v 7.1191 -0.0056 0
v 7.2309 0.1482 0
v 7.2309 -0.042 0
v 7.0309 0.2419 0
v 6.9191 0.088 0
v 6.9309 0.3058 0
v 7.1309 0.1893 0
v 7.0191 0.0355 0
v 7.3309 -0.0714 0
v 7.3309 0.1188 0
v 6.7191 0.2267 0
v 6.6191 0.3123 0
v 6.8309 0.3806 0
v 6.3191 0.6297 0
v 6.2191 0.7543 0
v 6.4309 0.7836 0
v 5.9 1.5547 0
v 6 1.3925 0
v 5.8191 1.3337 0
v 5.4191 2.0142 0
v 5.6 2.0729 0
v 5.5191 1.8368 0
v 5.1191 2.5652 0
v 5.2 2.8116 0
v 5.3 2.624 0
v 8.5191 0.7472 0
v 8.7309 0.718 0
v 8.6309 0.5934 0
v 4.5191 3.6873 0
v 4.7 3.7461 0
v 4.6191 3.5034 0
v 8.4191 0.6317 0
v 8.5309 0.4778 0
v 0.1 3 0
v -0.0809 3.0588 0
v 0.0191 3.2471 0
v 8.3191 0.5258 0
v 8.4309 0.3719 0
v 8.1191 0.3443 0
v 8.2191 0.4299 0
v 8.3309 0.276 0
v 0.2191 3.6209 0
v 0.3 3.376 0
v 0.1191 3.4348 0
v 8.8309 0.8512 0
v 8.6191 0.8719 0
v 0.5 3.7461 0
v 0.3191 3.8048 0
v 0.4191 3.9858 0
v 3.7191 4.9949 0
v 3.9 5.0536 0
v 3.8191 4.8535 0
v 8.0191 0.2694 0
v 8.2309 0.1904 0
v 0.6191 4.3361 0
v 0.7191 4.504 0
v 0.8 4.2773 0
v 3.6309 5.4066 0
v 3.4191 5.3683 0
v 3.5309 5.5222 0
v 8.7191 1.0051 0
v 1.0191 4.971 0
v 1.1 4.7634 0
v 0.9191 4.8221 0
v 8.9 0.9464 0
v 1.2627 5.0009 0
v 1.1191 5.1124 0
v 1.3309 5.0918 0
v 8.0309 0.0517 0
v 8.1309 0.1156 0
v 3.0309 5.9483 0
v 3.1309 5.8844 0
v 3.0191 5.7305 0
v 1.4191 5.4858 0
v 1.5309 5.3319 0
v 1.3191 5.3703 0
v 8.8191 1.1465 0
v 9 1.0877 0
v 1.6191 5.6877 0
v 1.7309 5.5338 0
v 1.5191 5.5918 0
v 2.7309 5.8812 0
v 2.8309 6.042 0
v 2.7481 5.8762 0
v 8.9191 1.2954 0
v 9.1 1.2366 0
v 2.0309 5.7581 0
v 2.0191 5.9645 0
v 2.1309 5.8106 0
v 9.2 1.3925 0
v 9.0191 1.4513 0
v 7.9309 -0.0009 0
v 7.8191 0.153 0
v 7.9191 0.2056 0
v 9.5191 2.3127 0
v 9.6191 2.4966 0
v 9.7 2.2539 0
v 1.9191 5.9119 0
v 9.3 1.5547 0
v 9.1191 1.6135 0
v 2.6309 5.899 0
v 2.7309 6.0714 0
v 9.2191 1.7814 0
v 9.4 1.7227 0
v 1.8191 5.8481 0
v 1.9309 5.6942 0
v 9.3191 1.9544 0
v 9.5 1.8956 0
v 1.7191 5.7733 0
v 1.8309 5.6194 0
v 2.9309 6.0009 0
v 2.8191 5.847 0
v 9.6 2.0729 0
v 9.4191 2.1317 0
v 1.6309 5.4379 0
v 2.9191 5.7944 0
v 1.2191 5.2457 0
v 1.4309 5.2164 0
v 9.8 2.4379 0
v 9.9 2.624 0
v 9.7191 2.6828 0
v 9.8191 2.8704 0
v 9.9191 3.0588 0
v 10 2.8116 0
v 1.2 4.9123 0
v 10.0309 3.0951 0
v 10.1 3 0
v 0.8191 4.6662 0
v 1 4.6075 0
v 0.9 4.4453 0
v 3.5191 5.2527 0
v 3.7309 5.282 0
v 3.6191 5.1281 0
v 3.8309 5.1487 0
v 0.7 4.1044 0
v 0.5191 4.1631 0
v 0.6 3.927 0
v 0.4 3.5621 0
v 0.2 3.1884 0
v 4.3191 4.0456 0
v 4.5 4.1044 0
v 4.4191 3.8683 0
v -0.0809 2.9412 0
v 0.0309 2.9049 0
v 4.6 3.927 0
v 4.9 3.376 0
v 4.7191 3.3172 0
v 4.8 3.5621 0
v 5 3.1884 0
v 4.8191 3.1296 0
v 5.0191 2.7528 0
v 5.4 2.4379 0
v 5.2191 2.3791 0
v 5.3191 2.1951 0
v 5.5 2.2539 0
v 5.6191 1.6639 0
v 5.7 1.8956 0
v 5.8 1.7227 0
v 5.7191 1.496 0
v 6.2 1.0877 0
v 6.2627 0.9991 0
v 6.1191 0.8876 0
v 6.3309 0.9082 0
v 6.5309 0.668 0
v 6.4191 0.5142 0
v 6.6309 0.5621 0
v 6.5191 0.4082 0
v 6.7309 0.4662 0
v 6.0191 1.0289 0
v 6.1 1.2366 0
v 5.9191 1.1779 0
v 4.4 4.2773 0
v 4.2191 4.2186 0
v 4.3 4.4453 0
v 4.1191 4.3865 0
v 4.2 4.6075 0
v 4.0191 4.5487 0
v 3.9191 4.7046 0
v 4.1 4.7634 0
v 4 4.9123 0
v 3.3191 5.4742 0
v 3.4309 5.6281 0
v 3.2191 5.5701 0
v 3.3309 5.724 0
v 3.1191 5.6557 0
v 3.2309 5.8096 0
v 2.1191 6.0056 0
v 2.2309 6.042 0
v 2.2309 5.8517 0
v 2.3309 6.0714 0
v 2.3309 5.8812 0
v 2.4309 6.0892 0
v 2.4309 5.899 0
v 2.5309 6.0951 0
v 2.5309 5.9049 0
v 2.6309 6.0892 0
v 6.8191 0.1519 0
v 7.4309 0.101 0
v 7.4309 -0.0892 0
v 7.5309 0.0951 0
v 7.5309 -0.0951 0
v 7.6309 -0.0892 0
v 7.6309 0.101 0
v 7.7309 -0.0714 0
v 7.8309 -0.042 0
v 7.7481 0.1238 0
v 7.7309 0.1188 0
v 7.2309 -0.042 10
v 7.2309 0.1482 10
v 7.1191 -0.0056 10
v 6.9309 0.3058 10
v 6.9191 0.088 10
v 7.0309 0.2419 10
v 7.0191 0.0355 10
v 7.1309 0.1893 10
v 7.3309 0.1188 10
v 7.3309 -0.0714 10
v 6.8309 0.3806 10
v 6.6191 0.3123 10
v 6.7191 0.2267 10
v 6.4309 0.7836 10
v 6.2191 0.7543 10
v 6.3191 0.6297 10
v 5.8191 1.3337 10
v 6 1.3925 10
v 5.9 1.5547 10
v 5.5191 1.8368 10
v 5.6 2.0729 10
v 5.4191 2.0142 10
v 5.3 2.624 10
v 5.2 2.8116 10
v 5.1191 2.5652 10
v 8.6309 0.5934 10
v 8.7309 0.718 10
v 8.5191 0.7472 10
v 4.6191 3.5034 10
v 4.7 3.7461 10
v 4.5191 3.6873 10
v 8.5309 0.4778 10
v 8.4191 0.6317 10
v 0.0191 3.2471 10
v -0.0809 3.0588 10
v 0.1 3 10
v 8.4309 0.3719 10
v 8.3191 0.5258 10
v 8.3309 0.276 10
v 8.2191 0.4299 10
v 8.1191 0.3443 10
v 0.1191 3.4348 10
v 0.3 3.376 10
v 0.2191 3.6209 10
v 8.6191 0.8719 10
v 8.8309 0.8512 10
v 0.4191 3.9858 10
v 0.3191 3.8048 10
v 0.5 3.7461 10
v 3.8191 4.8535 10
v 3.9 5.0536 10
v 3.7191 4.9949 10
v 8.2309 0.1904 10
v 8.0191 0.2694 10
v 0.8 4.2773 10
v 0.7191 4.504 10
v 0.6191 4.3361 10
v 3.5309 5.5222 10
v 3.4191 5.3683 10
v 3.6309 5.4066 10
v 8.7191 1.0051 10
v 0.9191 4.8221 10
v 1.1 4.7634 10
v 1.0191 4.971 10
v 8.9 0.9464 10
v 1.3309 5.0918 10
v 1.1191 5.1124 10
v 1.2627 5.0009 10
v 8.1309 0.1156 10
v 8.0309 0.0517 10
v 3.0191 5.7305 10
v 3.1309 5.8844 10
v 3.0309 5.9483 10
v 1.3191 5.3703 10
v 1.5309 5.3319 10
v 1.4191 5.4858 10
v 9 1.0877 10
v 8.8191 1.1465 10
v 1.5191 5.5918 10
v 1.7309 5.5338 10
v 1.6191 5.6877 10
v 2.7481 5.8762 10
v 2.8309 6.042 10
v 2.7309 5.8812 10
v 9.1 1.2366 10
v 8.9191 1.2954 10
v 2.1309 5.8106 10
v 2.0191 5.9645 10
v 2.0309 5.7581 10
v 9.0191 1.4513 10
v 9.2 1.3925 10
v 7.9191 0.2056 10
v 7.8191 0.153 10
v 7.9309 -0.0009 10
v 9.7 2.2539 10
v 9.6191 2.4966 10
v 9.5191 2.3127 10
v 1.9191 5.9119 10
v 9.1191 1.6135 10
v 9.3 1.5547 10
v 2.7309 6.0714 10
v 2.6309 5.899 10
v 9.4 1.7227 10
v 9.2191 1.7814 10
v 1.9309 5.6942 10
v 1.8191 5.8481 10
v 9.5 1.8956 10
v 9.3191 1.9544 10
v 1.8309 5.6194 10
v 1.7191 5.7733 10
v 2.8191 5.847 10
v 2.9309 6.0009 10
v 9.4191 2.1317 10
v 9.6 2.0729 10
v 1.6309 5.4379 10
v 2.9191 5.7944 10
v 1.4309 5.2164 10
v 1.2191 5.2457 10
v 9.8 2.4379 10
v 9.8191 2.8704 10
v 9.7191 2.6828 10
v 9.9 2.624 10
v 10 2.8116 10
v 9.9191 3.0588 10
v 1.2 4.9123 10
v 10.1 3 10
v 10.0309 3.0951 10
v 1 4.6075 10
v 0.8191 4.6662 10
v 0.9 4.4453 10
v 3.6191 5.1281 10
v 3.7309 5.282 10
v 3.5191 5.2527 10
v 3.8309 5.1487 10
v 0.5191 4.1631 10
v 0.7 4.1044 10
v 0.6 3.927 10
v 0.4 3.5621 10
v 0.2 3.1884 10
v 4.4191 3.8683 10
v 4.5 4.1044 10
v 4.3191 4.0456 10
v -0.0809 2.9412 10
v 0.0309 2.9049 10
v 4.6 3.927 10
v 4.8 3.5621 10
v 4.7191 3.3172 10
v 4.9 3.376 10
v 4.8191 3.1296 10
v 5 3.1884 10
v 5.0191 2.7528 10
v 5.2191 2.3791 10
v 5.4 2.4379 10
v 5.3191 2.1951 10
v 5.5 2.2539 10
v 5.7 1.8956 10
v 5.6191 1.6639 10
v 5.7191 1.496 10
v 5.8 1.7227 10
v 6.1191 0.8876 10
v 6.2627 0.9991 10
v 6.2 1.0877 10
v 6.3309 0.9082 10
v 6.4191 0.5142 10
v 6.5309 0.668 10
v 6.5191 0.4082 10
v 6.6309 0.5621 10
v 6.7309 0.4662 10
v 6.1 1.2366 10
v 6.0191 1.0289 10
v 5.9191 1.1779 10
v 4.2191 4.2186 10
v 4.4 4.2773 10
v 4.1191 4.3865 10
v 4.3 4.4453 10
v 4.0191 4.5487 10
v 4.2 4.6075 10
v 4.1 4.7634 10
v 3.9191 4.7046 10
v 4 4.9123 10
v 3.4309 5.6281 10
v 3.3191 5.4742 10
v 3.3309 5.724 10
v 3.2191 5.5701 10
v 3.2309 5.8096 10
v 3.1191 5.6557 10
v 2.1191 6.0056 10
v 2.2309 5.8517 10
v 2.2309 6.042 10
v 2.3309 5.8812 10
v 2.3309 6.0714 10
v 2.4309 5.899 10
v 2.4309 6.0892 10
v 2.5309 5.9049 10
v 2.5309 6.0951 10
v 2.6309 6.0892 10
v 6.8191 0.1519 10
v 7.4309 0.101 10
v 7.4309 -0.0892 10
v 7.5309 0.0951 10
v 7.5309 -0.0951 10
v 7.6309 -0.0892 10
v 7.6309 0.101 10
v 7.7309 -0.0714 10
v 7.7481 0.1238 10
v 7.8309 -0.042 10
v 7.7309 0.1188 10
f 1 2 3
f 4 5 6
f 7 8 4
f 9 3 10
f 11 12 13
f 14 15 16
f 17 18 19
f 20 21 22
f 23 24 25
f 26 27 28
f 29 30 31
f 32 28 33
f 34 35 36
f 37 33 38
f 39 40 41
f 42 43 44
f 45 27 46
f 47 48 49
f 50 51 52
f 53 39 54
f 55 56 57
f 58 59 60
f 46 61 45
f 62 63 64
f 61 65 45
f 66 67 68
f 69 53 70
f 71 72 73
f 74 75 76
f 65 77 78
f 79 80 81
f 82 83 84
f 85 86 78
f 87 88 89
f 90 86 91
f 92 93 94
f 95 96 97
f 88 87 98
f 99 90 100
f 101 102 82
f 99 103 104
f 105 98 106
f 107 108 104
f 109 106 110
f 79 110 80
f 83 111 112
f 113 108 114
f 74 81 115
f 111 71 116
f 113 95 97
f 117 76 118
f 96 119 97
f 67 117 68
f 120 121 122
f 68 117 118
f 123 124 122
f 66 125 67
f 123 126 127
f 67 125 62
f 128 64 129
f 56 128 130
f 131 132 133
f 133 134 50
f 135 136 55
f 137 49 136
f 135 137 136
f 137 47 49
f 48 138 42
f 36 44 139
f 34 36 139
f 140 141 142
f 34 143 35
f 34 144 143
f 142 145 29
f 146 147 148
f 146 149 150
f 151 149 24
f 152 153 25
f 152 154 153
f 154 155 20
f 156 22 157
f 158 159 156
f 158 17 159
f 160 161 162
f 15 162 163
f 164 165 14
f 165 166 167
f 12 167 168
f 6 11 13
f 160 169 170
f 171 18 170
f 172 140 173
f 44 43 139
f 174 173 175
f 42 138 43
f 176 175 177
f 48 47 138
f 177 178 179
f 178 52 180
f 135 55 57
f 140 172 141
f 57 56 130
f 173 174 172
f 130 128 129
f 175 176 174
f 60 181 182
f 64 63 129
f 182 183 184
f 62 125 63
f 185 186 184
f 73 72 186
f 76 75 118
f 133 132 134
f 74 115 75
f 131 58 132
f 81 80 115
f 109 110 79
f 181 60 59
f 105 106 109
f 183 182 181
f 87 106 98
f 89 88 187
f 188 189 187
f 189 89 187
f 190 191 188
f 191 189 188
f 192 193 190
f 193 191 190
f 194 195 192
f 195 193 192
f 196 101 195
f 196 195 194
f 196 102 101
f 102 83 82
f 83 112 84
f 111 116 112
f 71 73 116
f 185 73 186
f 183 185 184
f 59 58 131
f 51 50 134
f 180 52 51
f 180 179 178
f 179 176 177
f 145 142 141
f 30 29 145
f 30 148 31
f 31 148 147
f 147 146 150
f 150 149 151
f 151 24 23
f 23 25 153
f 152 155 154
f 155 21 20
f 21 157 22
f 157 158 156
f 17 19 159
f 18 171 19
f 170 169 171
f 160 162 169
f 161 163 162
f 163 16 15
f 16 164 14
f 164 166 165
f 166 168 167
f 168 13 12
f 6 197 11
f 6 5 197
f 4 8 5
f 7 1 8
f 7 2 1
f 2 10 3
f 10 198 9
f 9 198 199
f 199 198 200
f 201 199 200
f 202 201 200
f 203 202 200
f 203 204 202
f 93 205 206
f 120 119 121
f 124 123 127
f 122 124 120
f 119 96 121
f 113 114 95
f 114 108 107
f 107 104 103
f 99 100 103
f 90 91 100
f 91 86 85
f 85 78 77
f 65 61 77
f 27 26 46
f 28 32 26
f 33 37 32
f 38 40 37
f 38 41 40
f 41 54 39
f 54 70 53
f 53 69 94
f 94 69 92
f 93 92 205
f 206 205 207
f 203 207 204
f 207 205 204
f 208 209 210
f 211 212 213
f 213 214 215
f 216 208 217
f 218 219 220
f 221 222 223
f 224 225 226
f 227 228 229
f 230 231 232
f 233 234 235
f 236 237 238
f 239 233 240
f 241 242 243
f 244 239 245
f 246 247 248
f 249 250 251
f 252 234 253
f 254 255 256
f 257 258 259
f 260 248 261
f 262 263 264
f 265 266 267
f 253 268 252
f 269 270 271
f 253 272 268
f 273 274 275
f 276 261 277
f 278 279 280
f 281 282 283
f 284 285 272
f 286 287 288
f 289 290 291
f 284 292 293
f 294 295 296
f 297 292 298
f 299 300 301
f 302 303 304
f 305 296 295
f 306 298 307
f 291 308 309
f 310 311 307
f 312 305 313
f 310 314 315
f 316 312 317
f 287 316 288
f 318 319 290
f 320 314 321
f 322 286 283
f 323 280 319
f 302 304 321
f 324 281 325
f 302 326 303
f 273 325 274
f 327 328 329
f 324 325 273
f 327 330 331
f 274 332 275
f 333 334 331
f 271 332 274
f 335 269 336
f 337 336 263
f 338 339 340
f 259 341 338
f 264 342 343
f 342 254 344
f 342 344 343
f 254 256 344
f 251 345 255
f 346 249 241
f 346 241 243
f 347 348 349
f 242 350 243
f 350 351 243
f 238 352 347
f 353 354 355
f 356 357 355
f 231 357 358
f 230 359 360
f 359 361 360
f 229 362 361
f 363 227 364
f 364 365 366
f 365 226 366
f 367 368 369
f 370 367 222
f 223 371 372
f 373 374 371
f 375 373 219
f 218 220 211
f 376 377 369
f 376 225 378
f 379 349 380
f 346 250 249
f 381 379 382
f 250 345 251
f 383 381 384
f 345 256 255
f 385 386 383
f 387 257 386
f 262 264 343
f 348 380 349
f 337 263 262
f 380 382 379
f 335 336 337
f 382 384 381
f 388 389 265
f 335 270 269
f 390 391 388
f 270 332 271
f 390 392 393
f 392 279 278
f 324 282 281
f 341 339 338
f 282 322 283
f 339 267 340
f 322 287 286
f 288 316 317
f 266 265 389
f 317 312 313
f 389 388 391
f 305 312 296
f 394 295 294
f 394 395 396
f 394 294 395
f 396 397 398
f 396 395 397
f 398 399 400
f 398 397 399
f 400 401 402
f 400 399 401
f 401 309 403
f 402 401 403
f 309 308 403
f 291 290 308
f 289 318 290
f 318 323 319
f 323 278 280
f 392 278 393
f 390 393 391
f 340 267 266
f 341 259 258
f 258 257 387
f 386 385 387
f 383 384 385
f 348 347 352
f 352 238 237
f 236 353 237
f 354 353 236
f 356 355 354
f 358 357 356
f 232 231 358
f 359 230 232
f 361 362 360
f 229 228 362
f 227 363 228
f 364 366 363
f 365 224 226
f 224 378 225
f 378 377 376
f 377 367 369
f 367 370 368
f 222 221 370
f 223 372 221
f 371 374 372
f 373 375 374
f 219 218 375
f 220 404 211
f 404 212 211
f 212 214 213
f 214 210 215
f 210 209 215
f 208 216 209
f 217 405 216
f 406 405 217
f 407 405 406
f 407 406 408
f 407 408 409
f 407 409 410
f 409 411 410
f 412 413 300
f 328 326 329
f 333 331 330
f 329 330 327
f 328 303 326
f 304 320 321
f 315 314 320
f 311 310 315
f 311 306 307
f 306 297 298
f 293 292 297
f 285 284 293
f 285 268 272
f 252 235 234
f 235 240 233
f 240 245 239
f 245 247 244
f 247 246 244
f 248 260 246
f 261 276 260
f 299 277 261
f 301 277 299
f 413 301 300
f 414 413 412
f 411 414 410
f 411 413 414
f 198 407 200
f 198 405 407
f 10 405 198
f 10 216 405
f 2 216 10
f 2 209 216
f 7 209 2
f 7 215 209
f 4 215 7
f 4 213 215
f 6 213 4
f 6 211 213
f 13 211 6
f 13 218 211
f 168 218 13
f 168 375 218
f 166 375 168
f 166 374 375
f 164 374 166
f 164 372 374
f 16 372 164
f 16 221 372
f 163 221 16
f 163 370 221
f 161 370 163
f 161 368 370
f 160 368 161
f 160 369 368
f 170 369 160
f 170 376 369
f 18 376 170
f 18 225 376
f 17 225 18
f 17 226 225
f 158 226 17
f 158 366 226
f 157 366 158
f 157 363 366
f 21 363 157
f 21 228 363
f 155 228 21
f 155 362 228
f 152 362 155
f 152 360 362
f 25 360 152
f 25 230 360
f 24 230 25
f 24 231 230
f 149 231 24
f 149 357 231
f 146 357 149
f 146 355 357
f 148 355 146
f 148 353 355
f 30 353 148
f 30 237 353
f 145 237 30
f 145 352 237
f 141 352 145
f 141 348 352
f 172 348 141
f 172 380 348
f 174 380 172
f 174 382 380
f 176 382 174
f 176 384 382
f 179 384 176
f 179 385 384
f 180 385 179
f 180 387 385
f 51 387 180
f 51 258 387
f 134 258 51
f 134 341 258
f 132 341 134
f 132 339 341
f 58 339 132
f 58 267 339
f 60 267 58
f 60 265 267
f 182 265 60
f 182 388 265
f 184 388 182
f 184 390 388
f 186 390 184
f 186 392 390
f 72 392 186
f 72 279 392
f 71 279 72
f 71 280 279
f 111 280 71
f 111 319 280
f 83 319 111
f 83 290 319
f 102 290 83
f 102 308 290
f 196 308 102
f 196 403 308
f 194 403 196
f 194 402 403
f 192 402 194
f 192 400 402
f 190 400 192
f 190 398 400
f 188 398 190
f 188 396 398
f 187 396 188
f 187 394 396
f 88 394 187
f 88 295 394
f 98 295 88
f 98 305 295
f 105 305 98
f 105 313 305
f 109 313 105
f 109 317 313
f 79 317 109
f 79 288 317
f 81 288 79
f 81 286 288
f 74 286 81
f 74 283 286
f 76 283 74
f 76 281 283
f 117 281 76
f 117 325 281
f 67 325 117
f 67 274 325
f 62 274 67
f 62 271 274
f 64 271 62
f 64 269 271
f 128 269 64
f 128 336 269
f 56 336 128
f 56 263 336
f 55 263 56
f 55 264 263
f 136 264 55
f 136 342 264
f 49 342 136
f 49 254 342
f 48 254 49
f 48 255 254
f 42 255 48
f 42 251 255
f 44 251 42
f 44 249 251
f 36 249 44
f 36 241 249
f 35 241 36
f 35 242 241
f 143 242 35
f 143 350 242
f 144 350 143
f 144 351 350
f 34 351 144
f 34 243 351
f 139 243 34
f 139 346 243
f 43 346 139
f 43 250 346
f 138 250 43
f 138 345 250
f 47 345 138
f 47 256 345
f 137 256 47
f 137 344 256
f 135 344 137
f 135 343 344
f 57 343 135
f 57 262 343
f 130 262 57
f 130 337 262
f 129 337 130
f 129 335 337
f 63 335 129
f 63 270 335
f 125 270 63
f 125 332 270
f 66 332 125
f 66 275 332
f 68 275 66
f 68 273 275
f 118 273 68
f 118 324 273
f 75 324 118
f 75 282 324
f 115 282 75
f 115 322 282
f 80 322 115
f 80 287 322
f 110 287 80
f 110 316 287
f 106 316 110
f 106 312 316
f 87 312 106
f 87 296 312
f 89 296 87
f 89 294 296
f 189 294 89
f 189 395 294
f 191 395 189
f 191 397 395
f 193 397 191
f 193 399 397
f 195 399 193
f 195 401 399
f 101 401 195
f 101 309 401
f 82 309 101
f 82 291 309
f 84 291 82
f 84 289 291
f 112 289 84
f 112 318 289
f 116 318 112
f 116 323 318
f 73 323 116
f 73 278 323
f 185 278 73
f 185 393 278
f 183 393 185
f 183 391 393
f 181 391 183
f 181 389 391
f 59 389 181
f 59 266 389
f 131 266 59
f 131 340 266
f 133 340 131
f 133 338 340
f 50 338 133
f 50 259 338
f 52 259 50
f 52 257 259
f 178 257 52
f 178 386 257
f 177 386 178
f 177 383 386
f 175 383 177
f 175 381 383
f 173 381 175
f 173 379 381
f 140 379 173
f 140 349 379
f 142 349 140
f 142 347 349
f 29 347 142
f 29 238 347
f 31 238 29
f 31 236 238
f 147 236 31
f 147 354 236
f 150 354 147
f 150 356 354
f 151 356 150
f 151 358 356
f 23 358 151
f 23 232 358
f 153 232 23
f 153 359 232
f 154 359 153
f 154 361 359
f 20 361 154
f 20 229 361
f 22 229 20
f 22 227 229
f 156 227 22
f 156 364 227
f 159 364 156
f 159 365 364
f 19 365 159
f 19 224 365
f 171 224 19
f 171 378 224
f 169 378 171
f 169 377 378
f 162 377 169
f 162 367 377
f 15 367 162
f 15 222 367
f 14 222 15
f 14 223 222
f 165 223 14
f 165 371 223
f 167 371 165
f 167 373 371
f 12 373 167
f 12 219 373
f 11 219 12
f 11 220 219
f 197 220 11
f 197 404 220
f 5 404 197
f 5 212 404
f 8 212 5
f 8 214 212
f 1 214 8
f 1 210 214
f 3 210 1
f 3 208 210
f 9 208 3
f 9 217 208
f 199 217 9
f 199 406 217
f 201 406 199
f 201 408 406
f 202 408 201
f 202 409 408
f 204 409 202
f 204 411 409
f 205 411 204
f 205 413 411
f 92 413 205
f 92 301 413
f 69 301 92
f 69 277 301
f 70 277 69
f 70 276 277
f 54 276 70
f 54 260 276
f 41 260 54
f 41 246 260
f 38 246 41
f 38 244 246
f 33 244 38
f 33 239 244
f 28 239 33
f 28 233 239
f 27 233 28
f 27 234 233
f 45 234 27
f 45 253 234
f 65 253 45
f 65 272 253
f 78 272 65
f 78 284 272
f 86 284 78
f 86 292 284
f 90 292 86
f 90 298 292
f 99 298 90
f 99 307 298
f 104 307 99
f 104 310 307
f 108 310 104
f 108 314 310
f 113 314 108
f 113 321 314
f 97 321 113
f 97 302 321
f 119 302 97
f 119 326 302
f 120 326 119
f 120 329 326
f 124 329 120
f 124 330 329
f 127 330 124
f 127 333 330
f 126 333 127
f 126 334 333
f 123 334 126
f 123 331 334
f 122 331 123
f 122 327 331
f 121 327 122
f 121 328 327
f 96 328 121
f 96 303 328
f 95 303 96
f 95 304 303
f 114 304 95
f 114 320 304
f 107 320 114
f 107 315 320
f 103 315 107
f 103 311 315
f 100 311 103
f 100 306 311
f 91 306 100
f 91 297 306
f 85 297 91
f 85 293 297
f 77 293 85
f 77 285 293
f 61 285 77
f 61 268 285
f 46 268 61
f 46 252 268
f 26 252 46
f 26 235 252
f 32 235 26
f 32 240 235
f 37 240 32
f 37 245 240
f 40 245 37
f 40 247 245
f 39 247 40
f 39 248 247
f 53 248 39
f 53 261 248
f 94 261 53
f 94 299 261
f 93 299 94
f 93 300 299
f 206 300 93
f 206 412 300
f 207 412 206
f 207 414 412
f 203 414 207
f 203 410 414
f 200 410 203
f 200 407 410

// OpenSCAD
amplitude = 3; //y-height of the "curve"
samrat = 100; //resolution of sin wave
freq = 1; // # bumps
scale = 1/10; // scale factor for how long the feature is
height = 10; // z-height of the feature
av = 360*freq/samrat;

// smooth "cap" for the bumps
linear_extrude(height)for (i=[0:samrat-1])
{
    hull()
    {
        translate([i*scale,amplitude*(1+cos(-90+i*av)),0]) circle(0.1);
        translate([(i+1)*scale,amplitude*(1+cos(-90+(i+1)*av)),0]) circle(0.1);
    }
}

//// fill the area under the cap
//linear_extrude(height)for (i=[0:samrat-1])
//{
//    {
//        translate([i*scale,-0.1,0])
//        square([0.1,0.1+amplitude*(1+sin(-90+i*av))]);
//    }
//}
